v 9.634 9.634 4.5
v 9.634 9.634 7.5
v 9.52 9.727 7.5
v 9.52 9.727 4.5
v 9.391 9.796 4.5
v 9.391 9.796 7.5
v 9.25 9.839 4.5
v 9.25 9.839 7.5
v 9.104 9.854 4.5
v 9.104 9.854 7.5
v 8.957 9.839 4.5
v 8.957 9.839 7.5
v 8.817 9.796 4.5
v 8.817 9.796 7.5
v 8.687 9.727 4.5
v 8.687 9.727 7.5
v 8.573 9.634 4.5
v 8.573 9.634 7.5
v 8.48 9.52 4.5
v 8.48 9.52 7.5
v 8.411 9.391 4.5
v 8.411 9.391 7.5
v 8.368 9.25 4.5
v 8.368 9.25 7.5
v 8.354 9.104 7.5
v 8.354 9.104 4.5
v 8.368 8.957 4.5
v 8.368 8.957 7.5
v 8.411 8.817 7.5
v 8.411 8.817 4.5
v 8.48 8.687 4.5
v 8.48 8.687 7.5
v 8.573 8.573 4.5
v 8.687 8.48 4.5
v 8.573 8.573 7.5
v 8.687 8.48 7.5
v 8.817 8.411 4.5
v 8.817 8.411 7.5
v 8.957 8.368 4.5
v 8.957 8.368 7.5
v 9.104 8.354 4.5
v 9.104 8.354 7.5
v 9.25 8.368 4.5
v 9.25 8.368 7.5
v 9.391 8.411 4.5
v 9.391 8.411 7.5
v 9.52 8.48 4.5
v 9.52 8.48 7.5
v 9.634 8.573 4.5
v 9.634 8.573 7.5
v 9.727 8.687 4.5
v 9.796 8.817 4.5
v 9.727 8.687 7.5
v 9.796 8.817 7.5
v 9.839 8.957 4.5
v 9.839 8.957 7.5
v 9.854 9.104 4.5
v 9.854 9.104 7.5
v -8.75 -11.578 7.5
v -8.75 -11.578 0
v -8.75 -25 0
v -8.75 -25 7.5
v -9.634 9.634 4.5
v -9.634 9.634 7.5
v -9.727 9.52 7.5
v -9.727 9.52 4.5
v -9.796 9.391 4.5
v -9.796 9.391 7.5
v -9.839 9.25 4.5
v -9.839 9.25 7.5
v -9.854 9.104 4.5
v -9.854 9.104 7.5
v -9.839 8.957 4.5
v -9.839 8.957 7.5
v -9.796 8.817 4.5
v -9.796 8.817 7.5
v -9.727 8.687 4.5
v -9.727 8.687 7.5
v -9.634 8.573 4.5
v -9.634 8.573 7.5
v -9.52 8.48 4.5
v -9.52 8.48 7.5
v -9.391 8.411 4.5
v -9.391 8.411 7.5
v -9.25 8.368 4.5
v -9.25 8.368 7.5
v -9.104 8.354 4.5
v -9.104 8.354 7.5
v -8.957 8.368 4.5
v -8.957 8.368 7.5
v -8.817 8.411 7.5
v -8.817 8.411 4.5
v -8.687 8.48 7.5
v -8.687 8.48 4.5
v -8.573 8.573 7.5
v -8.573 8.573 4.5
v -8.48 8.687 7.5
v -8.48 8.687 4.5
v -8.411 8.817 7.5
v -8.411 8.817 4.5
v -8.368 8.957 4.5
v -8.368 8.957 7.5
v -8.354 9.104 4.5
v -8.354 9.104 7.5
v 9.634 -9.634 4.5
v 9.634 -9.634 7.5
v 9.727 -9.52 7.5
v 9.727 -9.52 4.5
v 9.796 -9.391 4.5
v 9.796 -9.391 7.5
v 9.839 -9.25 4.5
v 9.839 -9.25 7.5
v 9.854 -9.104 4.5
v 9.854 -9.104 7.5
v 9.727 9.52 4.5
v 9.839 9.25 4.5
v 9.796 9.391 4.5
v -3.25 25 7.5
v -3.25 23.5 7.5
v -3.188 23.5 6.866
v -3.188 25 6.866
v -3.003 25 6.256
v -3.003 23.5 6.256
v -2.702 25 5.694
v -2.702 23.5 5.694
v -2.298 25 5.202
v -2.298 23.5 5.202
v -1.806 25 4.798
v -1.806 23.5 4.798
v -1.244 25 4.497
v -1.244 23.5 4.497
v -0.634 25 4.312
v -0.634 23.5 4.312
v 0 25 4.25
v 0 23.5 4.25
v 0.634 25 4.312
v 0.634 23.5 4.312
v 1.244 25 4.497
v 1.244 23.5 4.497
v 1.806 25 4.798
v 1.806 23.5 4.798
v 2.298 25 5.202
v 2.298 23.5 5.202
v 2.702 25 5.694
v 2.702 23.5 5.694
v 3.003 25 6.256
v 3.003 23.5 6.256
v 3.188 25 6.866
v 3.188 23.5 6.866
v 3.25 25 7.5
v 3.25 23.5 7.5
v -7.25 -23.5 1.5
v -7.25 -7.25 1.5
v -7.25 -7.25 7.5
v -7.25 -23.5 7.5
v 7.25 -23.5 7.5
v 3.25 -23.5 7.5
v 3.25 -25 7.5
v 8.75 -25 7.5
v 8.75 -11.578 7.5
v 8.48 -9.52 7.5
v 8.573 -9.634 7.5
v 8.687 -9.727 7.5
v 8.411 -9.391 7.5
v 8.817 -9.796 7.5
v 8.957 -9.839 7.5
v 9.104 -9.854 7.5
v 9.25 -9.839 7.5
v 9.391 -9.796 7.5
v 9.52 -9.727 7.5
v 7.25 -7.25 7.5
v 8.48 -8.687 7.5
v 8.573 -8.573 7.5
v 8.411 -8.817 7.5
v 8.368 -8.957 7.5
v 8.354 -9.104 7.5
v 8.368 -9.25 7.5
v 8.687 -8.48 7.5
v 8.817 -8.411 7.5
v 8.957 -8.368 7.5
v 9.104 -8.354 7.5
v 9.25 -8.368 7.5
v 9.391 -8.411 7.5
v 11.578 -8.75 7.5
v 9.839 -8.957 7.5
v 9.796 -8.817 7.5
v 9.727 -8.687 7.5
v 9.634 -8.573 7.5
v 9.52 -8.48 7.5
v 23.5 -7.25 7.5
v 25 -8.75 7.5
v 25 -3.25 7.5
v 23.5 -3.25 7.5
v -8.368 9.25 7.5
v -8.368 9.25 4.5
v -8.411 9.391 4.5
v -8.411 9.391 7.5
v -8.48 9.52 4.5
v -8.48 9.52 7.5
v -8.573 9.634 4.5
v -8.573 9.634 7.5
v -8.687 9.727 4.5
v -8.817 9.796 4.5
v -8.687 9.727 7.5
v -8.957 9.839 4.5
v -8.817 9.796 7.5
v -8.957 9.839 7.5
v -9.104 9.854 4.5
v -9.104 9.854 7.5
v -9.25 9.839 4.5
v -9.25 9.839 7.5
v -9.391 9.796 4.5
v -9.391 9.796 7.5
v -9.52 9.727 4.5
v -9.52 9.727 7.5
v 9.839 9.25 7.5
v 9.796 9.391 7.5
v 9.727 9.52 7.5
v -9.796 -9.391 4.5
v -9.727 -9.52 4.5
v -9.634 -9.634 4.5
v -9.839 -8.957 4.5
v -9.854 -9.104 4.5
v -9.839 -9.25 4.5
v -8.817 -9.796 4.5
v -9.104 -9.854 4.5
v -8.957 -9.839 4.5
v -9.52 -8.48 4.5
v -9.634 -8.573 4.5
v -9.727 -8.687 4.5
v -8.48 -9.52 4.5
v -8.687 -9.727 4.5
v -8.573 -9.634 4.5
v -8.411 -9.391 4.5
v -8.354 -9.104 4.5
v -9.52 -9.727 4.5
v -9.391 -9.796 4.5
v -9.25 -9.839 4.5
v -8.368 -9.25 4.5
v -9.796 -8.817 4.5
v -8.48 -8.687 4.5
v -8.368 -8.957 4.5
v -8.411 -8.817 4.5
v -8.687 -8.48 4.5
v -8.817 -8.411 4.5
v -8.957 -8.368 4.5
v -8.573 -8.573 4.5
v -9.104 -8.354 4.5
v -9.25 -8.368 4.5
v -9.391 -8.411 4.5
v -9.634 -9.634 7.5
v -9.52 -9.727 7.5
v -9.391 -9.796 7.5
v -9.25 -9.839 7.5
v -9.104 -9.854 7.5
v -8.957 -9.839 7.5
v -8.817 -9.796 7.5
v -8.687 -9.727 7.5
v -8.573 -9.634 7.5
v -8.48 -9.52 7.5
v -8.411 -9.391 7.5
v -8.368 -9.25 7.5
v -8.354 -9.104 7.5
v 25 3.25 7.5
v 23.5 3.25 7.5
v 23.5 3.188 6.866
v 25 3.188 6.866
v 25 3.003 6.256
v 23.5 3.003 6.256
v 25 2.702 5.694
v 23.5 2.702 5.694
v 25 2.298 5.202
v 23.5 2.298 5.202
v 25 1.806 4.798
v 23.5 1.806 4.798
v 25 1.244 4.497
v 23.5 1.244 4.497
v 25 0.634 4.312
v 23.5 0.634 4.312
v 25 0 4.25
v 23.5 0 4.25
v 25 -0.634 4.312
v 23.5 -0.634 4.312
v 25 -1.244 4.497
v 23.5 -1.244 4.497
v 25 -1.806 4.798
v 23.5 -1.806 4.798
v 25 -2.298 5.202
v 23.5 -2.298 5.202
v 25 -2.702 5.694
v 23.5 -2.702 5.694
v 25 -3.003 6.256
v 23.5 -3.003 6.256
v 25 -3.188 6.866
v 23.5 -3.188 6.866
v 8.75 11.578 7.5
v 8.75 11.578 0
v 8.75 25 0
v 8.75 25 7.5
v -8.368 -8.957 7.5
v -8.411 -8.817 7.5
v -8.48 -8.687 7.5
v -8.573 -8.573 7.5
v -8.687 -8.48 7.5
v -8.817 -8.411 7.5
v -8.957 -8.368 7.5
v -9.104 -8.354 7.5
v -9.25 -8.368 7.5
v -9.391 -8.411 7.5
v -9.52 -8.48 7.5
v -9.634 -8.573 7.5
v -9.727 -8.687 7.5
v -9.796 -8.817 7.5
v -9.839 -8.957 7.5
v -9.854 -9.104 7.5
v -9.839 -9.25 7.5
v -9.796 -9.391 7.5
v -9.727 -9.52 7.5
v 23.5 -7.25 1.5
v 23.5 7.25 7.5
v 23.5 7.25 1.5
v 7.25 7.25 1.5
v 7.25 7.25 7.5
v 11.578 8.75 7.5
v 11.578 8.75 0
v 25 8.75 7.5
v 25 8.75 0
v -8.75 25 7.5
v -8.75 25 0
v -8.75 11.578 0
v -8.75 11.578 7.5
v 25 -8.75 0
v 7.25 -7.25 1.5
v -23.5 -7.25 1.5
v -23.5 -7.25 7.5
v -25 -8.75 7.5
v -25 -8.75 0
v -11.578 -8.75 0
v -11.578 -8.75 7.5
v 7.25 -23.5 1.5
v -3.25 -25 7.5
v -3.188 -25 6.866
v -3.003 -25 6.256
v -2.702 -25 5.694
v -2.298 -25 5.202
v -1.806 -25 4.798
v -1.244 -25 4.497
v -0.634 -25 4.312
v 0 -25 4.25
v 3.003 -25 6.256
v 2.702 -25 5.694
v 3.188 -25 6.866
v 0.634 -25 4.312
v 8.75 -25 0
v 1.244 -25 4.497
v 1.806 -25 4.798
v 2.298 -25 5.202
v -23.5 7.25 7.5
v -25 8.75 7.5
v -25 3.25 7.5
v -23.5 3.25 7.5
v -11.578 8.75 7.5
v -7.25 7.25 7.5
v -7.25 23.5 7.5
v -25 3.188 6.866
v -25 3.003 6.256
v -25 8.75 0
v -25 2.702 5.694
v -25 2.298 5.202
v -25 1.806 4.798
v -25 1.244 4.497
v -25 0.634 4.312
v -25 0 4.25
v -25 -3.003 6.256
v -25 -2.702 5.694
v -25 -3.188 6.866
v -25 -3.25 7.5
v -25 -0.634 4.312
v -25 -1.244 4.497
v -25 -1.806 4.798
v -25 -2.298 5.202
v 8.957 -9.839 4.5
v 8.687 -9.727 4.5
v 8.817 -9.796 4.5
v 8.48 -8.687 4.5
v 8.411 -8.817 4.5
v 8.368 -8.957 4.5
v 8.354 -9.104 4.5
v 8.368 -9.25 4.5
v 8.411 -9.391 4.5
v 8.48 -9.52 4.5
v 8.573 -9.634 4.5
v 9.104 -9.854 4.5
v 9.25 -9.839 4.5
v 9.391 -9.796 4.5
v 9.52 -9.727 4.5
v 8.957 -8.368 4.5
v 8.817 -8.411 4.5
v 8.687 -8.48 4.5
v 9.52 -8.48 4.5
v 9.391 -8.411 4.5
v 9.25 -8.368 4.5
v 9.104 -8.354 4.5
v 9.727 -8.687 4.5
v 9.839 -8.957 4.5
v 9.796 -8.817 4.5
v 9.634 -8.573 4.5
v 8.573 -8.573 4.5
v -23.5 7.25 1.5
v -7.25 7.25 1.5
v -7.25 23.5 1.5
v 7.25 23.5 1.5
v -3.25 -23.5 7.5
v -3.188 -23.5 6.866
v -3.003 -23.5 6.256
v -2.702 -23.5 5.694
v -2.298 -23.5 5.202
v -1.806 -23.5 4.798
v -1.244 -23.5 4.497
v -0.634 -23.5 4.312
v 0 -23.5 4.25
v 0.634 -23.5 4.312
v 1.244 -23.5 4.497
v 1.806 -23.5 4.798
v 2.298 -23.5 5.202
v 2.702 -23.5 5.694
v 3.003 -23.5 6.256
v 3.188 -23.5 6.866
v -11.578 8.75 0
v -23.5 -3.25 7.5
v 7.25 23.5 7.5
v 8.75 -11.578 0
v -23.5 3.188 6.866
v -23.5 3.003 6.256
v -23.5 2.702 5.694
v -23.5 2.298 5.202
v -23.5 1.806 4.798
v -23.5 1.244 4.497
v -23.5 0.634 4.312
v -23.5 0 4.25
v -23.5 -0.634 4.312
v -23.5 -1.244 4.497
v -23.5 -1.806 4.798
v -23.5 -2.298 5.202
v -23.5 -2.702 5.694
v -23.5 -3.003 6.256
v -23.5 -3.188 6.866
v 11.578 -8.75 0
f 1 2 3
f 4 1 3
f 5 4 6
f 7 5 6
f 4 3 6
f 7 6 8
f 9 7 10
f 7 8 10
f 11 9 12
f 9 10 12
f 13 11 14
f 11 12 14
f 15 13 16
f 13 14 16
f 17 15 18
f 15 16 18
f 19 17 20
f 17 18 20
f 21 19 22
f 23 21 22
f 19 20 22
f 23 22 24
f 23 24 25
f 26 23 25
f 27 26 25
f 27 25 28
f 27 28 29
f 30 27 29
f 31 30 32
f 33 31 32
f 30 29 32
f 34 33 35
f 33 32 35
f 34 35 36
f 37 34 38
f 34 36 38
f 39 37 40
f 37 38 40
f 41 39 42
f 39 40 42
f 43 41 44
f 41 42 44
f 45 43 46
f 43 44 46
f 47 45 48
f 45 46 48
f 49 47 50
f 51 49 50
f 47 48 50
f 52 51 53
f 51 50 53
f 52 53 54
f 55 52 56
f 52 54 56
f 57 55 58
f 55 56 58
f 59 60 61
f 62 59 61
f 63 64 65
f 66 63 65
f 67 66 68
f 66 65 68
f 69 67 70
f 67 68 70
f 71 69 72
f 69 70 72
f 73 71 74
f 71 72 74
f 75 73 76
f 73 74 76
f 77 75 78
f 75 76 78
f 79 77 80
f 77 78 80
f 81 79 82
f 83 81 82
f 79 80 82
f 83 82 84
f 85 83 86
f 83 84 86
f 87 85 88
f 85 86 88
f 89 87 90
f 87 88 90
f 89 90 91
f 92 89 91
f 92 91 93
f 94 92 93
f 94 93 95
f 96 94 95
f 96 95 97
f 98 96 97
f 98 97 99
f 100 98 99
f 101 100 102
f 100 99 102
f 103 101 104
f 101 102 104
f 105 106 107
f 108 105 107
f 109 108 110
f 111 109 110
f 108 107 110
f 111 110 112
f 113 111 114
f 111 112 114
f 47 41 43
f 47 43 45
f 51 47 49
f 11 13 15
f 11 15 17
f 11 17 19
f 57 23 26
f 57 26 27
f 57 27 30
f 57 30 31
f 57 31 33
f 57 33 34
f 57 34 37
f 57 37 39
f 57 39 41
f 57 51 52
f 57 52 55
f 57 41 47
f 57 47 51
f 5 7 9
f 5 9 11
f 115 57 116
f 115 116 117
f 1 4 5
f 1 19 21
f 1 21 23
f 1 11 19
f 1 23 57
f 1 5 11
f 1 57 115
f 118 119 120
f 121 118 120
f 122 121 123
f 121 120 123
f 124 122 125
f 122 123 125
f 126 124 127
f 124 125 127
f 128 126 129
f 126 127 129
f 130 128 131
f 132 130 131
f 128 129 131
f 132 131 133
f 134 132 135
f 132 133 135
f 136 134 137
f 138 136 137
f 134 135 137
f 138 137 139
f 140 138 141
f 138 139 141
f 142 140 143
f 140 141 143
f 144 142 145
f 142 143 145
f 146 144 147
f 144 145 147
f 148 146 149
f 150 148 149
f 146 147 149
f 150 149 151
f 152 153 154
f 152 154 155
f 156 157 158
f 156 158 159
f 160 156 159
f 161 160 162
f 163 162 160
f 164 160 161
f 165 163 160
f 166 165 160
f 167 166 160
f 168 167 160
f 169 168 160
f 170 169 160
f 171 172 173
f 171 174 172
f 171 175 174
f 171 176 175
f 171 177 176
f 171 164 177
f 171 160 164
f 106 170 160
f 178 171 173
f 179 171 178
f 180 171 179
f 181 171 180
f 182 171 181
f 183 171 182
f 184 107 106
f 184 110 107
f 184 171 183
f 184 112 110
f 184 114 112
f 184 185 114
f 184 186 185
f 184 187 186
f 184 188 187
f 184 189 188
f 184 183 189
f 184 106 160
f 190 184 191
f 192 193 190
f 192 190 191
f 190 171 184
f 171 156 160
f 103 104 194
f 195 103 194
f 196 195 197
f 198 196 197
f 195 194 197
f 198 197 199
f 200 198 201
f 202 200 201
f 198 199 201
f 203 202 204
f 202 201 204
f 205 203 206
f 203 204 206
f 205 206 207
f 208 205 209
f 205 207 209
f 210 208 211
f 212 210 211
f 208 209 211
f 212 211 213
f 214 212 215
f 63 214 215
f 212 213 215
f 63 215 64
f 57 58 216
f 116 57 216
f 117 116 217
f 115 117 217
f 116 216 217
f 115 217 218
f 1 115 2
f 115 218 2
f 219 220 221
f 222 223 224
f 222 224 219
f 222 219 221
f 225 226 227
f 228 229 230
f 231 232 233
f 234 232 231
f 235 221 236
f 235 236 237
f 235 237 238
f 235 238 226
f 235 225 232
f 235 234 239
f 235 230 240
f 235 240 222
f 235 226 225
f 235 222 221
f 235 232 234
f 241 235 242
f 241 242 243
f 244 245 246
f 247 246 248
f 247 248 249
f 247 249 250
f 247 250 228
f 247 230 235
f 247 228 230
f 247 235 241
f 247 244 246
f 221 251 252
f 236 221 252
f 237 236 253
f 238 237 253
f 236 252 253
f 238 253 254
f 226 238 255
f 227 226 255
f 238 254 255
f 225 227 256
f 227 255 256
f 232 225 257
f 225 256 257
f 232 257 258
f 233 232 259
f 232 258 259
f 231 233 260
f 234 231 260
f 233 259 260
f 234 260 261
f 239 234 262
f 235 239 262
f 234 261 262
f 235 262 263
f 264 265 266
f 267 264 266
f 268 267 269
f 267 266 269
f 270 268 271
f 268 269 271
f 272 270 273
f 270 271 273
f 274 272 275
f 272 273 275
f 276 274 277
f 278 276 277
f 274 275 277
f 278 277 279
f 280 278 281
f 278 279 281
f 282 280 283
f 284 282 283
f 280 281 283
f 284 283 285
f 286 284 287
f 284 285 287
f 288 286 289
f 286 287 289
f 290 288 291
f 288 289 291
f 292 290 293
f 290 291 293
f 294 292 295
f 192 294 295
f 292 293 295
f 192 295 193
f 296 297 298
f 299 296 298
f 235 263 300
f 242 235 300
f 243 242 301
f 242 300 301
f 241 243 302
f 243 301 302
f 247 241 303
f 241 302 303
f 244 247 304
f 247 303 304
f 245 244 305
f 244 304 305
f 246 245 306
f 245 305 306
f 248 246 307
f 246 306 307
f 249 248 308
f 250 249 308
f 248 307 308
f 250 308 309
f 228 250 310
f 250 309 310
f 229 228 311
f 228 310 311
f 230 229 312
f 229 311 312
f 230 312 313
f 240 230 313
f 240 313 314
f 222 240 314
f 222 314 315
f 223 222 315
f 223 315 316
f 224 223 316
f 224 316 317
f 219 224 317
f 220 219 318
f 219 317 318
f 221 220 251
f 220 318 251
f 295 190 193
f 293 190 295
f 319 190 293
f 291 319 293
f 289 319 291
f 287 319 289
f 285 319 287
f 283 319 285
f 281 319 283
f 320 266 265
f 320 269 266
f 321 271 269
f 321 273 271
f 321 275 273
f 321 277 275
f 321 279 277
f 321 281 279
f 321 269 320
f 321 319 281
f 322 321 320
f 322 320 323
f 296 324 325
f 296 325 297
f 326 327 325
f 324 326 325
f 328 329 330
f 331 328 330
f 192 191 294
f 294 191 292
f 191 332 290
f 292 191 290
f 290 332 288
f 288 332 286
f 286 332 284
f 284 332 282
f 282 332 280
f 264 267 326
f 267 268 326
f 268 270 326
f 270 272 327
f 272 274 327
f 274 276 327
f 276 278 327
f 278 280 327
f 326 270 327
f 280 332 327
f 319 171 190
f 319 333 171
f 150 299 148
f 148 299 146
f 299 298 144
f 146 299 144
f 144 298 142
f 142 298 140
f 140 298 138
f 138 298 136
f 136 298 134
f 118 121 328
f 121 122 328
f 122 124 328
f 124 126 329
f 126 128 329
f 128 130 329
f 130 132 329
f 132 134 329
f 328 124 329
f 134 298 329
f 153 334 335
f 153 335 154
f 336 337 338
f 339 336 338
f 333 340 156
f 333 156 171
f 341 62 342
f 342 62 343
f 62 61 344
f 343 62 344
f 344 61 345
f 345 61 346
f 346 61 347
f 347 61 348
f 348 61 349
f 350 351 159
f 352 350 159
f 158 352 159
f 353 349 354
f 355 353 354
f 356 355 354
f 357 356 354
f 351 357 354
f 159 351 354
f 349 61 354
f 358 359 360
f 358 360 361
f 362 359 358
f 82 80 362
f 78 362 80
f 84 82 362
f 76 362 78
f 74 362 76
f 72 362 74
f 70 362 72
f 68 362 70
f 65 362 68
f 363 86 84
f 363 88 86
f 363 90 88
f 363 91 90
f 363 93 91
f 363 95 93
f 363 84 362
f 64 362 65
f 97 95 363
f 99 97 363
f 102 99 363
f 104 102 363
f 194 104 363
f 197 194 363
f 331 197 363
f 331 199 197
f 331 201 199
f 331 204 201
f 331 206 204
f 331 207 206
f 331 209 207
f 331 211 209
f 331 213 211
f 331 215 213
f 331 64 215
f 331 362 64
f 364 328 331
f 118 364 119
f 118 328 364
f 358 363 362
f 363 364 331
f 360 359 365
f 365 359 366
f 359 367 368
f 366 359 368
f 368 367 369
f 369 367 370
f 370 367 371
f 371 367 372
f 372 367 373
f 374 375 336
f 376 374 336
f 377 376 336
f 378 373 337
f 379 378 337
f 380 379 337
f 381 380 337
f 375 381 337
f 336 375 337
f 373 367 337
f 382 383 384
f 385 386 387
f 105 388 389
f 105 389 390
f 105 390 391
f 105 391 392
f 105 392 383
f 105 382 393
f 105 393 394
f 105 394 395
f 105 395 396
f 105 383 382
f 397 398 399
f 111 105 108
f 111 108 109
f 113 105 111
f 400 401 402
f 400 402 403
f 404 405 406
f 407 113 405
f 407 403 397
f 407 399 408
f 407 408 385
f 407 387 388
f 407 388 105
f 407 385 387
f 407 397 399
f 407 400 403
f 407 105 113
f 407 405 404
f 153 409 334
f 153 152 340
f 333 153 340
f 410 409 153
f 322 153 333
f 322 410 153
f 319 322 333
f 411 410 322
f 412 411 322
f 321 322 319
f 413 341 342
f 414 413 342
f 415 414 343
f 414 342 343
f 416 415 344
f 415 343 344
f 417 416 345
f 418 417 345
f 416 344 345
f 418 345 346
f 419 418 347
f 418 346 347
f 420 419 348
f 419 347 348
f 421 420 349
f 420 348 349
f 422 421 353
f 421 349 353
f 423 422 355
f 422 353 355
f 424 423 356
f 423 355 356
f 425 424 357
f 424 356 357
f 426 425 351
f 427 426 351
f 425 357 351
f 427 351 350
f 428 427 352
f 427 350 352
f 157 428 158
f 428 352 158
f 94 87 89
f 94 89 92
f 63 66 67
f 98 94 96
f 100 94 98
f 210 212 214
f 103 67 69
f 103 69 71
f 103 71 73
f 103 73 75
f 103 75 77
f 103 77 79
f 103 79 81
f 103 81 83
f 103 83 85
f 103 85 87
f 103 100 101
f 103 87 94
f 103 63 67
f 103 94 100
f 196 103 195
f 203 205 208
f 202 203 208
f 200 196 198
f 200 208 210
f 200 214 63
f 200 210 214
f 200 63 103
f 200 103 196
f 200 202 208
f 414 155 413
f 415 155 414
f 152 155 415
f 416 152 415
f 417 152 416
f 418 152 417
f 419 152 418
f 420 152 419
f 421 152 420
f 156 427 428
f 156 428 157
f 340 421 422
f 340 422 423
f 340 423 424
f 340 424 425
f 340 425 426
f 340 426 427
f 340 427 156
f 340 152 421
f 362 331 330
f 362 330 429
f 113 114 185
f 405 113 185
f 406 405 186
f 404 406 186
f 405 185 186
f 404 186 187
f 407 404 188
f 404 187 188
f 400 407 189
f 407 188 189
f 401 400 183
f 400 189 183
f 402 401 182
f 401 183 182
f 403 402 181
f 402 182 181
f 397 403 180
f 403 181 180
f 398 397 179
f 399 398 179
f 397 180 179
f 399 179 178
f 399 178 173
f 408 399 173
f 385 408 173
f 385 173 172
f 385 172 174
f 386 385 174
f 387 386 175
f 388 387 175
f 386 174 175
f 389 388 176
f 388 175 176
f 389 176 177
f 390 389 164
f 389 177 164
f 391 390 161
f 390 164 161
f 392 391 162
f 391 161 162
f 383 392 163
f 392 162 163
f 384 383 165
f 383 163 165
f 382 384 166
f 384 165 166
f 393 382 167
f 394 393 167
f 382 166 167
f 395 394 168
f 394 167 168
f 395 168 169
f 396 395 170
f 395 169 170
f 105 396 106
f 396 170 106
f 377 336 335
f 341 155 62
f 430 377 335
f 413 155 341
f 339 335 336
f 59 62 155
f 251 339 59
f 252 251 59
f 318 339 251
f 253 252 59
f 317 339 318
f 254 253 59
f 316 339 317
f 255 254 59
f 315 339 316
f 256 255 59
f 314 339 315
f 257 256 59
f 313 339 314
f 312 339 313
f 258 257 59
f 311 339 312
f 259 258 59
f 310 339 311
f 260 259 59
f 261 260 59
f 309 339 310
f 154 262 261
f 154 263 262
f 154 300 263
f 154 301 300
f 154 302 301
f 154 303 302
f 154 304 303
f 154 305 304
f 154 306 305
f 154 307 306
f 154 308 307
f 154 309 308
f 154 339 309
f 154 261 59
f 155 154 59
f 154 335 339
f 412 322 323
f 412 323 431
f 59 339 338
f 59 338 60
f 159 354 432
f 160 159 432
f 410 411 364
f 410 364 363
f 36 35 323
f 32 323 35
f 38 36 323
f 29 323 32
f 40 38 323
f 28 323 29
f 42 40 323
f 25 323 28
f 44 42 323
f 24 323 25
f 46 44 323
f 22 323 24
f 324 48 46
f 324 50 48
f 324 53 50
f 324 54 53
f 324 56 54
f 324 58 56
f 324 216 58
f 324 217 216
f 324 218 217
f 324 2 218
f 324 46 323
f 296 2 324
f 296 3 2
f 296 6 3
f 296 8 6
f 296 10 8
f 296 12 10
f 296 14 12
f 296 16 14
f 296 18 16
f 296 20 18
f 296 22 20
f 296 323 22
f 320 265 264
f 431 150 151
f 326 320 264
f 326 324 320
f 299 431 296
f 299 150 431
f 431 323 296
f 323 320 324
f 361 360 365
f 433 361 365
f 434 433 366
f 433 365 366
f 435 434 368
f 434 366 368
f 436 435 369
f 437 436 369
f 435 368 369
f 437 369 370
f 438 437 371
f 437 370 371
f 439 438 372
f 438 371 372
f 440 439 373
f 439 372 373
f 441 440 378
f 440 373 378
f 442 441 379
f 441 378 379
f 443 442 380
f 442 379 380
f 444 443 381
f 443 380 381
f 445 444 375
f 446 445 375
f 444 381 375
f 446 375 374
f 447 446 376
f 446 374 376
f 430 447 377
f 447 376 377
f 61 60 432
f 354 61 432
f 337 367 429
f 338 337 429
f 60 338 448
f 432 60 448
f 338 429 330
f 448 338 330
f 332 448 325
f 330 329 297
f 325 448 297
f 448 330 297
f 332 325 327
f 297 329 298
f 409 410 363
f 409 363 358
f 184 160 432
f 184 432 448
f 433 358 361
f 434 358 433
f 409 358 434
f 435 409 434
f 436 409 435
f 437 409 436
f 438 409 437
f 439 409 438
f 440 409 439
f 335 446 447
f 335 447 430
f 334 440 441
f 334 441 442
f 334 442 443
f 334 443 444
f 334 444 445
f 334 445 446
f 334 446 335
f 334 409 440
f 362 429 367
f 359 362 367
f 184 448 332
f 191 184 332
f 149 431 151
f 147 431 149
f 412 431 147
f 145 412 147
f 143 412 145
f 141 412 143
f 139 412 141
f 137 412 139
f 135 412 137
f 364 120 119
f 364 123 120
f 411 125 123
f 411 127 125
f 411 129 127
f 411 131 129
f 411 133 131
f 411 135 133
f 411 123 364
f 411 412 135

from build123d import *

# Parameters (mm, degrees)
F1_DEPTH  = 7.5
F2_T      = -1.5
F4_DEPTH  = 7.5
F6_DEPTH  = 3
F7_R      = 3.25
F8_DEPTH  = 50.001
F9_R      = 3.25
F10_DEPTH = 50.001


with BuildPart() as f1:
    # F0 (on Top) → F1 (new body)
    with BuildSketch(Plane.XY):
        Polygon((25, -8.75), (25, 8.75), (8.75, 8.75), (8.75, 25), (-8.75, 25), (-8.75, 8.75), (-25, 8.75), (-25, -8.75), (-8.75, -8.75), (-8.75, -25), (8.75, -25), (8.75, -8.75), align=None)
    extrude(amount=F1_DEPTH)

    # F2
    f2_openings = [f1.faces().sort_by_distance(p)[0] for p in [
        (0, 0, 7.5),
    ]]
    offset(amount=F2_T, openings=f2_openings, kind=Kind.INTERSECTION)

    # F3 (on face) → F4 (join, through all)
    with BuildSketch(Plane.XY.offset(7.5)):
        Polygon((-8.75, 11.5784271247), (-11.5784271247, 8.75), (-8.75, 8.75), align=None)
        Polygon((8.75, 11.5784271247), (8.75, 8.75), (11.5784271247, 8.75), align=None)
        Polygon((-8.75, -11.5784271247), (-8.75, -8.75), (-11.5784271247, -8.75), align=None)
        Polygon((11.5784271247, -8.75), (8.75, -8.75), (8.75, -11.5784271247), align=None)
    extrude(amount=-F4_DEPTH)

    # F5 (on face) → F6 (cut)
    with BuildSketch(Plane.XY.offset(7.5)):
        with BuildLine():
            ThreePointArc((-9.6338834765, 9.6338834765), (-9.3905659649, 8.4106437412), (-8.3535533906, 9.1035533906))
            ThreePointArc((-8.3535533906, 9.1035533906), (-8.8165408163, 9.79646304), (-9.6338834765, 9.6338834765))
        make_face()
        with BuildLine():
            ThreePointArc((9.6338834765, 9.6338834765), (8.4106437412, 8.8165408163), (9.8535533906, 9.1035533906))
            ThreePointArc((9.8535533906, 9.1035533906), (9.79646304, 9.3905659649), (9.6338834765, 9.6338834765))
        make_face()
        with BuildLine():
            ThreePointArc((9.6338834765, -9.6338834765), (9.79646304, -9.3905659649), (9.8535533906, -9.1035533906))
            ThreePointArc((9.8535533906, -9.1035533906), (8.4106437412, -8.8165408163), (9.6338834765, -9.6338834765))
        make_face()
        with BuildLine():
            ThreePointArc((-9.6338834765, -9.6338834765), (-8.8165408163, -9.79646304), (-8.3535533906, -9.1035533906))
            ThreePointArc((-8.3535533906, -9.1035533906), (-9.3905659649, -8.4106437412), (-9.6338834765, -9.6338834765))
        make_face()
    extrude(amount=-F6_DEPTH, mode=Mode.SUBTRACT)

    # F7 (on face) → F8 (cut, through all)
    with BuildSketch(Plane.XZ.offset(25)):
        with Locations((0, 7.5)):
            Circle(F7_R)
    extrude(amount=-F8_DEPTH, mode=Mode.SUBTRACT)

    # F9 (on face) → F10 (cut, through all)
    with BuildSketch(Plane(origin=(-25, 0, 0), x_dir=(0, -1, 0), z_dir=(-1, 0, 0))):
        with Locations((0, 7.5)):
            Circle(F9_R)
    extrude(amount=-F10_DEPTH, mode=Mode.SUBTRACT)


solid = f1.part
